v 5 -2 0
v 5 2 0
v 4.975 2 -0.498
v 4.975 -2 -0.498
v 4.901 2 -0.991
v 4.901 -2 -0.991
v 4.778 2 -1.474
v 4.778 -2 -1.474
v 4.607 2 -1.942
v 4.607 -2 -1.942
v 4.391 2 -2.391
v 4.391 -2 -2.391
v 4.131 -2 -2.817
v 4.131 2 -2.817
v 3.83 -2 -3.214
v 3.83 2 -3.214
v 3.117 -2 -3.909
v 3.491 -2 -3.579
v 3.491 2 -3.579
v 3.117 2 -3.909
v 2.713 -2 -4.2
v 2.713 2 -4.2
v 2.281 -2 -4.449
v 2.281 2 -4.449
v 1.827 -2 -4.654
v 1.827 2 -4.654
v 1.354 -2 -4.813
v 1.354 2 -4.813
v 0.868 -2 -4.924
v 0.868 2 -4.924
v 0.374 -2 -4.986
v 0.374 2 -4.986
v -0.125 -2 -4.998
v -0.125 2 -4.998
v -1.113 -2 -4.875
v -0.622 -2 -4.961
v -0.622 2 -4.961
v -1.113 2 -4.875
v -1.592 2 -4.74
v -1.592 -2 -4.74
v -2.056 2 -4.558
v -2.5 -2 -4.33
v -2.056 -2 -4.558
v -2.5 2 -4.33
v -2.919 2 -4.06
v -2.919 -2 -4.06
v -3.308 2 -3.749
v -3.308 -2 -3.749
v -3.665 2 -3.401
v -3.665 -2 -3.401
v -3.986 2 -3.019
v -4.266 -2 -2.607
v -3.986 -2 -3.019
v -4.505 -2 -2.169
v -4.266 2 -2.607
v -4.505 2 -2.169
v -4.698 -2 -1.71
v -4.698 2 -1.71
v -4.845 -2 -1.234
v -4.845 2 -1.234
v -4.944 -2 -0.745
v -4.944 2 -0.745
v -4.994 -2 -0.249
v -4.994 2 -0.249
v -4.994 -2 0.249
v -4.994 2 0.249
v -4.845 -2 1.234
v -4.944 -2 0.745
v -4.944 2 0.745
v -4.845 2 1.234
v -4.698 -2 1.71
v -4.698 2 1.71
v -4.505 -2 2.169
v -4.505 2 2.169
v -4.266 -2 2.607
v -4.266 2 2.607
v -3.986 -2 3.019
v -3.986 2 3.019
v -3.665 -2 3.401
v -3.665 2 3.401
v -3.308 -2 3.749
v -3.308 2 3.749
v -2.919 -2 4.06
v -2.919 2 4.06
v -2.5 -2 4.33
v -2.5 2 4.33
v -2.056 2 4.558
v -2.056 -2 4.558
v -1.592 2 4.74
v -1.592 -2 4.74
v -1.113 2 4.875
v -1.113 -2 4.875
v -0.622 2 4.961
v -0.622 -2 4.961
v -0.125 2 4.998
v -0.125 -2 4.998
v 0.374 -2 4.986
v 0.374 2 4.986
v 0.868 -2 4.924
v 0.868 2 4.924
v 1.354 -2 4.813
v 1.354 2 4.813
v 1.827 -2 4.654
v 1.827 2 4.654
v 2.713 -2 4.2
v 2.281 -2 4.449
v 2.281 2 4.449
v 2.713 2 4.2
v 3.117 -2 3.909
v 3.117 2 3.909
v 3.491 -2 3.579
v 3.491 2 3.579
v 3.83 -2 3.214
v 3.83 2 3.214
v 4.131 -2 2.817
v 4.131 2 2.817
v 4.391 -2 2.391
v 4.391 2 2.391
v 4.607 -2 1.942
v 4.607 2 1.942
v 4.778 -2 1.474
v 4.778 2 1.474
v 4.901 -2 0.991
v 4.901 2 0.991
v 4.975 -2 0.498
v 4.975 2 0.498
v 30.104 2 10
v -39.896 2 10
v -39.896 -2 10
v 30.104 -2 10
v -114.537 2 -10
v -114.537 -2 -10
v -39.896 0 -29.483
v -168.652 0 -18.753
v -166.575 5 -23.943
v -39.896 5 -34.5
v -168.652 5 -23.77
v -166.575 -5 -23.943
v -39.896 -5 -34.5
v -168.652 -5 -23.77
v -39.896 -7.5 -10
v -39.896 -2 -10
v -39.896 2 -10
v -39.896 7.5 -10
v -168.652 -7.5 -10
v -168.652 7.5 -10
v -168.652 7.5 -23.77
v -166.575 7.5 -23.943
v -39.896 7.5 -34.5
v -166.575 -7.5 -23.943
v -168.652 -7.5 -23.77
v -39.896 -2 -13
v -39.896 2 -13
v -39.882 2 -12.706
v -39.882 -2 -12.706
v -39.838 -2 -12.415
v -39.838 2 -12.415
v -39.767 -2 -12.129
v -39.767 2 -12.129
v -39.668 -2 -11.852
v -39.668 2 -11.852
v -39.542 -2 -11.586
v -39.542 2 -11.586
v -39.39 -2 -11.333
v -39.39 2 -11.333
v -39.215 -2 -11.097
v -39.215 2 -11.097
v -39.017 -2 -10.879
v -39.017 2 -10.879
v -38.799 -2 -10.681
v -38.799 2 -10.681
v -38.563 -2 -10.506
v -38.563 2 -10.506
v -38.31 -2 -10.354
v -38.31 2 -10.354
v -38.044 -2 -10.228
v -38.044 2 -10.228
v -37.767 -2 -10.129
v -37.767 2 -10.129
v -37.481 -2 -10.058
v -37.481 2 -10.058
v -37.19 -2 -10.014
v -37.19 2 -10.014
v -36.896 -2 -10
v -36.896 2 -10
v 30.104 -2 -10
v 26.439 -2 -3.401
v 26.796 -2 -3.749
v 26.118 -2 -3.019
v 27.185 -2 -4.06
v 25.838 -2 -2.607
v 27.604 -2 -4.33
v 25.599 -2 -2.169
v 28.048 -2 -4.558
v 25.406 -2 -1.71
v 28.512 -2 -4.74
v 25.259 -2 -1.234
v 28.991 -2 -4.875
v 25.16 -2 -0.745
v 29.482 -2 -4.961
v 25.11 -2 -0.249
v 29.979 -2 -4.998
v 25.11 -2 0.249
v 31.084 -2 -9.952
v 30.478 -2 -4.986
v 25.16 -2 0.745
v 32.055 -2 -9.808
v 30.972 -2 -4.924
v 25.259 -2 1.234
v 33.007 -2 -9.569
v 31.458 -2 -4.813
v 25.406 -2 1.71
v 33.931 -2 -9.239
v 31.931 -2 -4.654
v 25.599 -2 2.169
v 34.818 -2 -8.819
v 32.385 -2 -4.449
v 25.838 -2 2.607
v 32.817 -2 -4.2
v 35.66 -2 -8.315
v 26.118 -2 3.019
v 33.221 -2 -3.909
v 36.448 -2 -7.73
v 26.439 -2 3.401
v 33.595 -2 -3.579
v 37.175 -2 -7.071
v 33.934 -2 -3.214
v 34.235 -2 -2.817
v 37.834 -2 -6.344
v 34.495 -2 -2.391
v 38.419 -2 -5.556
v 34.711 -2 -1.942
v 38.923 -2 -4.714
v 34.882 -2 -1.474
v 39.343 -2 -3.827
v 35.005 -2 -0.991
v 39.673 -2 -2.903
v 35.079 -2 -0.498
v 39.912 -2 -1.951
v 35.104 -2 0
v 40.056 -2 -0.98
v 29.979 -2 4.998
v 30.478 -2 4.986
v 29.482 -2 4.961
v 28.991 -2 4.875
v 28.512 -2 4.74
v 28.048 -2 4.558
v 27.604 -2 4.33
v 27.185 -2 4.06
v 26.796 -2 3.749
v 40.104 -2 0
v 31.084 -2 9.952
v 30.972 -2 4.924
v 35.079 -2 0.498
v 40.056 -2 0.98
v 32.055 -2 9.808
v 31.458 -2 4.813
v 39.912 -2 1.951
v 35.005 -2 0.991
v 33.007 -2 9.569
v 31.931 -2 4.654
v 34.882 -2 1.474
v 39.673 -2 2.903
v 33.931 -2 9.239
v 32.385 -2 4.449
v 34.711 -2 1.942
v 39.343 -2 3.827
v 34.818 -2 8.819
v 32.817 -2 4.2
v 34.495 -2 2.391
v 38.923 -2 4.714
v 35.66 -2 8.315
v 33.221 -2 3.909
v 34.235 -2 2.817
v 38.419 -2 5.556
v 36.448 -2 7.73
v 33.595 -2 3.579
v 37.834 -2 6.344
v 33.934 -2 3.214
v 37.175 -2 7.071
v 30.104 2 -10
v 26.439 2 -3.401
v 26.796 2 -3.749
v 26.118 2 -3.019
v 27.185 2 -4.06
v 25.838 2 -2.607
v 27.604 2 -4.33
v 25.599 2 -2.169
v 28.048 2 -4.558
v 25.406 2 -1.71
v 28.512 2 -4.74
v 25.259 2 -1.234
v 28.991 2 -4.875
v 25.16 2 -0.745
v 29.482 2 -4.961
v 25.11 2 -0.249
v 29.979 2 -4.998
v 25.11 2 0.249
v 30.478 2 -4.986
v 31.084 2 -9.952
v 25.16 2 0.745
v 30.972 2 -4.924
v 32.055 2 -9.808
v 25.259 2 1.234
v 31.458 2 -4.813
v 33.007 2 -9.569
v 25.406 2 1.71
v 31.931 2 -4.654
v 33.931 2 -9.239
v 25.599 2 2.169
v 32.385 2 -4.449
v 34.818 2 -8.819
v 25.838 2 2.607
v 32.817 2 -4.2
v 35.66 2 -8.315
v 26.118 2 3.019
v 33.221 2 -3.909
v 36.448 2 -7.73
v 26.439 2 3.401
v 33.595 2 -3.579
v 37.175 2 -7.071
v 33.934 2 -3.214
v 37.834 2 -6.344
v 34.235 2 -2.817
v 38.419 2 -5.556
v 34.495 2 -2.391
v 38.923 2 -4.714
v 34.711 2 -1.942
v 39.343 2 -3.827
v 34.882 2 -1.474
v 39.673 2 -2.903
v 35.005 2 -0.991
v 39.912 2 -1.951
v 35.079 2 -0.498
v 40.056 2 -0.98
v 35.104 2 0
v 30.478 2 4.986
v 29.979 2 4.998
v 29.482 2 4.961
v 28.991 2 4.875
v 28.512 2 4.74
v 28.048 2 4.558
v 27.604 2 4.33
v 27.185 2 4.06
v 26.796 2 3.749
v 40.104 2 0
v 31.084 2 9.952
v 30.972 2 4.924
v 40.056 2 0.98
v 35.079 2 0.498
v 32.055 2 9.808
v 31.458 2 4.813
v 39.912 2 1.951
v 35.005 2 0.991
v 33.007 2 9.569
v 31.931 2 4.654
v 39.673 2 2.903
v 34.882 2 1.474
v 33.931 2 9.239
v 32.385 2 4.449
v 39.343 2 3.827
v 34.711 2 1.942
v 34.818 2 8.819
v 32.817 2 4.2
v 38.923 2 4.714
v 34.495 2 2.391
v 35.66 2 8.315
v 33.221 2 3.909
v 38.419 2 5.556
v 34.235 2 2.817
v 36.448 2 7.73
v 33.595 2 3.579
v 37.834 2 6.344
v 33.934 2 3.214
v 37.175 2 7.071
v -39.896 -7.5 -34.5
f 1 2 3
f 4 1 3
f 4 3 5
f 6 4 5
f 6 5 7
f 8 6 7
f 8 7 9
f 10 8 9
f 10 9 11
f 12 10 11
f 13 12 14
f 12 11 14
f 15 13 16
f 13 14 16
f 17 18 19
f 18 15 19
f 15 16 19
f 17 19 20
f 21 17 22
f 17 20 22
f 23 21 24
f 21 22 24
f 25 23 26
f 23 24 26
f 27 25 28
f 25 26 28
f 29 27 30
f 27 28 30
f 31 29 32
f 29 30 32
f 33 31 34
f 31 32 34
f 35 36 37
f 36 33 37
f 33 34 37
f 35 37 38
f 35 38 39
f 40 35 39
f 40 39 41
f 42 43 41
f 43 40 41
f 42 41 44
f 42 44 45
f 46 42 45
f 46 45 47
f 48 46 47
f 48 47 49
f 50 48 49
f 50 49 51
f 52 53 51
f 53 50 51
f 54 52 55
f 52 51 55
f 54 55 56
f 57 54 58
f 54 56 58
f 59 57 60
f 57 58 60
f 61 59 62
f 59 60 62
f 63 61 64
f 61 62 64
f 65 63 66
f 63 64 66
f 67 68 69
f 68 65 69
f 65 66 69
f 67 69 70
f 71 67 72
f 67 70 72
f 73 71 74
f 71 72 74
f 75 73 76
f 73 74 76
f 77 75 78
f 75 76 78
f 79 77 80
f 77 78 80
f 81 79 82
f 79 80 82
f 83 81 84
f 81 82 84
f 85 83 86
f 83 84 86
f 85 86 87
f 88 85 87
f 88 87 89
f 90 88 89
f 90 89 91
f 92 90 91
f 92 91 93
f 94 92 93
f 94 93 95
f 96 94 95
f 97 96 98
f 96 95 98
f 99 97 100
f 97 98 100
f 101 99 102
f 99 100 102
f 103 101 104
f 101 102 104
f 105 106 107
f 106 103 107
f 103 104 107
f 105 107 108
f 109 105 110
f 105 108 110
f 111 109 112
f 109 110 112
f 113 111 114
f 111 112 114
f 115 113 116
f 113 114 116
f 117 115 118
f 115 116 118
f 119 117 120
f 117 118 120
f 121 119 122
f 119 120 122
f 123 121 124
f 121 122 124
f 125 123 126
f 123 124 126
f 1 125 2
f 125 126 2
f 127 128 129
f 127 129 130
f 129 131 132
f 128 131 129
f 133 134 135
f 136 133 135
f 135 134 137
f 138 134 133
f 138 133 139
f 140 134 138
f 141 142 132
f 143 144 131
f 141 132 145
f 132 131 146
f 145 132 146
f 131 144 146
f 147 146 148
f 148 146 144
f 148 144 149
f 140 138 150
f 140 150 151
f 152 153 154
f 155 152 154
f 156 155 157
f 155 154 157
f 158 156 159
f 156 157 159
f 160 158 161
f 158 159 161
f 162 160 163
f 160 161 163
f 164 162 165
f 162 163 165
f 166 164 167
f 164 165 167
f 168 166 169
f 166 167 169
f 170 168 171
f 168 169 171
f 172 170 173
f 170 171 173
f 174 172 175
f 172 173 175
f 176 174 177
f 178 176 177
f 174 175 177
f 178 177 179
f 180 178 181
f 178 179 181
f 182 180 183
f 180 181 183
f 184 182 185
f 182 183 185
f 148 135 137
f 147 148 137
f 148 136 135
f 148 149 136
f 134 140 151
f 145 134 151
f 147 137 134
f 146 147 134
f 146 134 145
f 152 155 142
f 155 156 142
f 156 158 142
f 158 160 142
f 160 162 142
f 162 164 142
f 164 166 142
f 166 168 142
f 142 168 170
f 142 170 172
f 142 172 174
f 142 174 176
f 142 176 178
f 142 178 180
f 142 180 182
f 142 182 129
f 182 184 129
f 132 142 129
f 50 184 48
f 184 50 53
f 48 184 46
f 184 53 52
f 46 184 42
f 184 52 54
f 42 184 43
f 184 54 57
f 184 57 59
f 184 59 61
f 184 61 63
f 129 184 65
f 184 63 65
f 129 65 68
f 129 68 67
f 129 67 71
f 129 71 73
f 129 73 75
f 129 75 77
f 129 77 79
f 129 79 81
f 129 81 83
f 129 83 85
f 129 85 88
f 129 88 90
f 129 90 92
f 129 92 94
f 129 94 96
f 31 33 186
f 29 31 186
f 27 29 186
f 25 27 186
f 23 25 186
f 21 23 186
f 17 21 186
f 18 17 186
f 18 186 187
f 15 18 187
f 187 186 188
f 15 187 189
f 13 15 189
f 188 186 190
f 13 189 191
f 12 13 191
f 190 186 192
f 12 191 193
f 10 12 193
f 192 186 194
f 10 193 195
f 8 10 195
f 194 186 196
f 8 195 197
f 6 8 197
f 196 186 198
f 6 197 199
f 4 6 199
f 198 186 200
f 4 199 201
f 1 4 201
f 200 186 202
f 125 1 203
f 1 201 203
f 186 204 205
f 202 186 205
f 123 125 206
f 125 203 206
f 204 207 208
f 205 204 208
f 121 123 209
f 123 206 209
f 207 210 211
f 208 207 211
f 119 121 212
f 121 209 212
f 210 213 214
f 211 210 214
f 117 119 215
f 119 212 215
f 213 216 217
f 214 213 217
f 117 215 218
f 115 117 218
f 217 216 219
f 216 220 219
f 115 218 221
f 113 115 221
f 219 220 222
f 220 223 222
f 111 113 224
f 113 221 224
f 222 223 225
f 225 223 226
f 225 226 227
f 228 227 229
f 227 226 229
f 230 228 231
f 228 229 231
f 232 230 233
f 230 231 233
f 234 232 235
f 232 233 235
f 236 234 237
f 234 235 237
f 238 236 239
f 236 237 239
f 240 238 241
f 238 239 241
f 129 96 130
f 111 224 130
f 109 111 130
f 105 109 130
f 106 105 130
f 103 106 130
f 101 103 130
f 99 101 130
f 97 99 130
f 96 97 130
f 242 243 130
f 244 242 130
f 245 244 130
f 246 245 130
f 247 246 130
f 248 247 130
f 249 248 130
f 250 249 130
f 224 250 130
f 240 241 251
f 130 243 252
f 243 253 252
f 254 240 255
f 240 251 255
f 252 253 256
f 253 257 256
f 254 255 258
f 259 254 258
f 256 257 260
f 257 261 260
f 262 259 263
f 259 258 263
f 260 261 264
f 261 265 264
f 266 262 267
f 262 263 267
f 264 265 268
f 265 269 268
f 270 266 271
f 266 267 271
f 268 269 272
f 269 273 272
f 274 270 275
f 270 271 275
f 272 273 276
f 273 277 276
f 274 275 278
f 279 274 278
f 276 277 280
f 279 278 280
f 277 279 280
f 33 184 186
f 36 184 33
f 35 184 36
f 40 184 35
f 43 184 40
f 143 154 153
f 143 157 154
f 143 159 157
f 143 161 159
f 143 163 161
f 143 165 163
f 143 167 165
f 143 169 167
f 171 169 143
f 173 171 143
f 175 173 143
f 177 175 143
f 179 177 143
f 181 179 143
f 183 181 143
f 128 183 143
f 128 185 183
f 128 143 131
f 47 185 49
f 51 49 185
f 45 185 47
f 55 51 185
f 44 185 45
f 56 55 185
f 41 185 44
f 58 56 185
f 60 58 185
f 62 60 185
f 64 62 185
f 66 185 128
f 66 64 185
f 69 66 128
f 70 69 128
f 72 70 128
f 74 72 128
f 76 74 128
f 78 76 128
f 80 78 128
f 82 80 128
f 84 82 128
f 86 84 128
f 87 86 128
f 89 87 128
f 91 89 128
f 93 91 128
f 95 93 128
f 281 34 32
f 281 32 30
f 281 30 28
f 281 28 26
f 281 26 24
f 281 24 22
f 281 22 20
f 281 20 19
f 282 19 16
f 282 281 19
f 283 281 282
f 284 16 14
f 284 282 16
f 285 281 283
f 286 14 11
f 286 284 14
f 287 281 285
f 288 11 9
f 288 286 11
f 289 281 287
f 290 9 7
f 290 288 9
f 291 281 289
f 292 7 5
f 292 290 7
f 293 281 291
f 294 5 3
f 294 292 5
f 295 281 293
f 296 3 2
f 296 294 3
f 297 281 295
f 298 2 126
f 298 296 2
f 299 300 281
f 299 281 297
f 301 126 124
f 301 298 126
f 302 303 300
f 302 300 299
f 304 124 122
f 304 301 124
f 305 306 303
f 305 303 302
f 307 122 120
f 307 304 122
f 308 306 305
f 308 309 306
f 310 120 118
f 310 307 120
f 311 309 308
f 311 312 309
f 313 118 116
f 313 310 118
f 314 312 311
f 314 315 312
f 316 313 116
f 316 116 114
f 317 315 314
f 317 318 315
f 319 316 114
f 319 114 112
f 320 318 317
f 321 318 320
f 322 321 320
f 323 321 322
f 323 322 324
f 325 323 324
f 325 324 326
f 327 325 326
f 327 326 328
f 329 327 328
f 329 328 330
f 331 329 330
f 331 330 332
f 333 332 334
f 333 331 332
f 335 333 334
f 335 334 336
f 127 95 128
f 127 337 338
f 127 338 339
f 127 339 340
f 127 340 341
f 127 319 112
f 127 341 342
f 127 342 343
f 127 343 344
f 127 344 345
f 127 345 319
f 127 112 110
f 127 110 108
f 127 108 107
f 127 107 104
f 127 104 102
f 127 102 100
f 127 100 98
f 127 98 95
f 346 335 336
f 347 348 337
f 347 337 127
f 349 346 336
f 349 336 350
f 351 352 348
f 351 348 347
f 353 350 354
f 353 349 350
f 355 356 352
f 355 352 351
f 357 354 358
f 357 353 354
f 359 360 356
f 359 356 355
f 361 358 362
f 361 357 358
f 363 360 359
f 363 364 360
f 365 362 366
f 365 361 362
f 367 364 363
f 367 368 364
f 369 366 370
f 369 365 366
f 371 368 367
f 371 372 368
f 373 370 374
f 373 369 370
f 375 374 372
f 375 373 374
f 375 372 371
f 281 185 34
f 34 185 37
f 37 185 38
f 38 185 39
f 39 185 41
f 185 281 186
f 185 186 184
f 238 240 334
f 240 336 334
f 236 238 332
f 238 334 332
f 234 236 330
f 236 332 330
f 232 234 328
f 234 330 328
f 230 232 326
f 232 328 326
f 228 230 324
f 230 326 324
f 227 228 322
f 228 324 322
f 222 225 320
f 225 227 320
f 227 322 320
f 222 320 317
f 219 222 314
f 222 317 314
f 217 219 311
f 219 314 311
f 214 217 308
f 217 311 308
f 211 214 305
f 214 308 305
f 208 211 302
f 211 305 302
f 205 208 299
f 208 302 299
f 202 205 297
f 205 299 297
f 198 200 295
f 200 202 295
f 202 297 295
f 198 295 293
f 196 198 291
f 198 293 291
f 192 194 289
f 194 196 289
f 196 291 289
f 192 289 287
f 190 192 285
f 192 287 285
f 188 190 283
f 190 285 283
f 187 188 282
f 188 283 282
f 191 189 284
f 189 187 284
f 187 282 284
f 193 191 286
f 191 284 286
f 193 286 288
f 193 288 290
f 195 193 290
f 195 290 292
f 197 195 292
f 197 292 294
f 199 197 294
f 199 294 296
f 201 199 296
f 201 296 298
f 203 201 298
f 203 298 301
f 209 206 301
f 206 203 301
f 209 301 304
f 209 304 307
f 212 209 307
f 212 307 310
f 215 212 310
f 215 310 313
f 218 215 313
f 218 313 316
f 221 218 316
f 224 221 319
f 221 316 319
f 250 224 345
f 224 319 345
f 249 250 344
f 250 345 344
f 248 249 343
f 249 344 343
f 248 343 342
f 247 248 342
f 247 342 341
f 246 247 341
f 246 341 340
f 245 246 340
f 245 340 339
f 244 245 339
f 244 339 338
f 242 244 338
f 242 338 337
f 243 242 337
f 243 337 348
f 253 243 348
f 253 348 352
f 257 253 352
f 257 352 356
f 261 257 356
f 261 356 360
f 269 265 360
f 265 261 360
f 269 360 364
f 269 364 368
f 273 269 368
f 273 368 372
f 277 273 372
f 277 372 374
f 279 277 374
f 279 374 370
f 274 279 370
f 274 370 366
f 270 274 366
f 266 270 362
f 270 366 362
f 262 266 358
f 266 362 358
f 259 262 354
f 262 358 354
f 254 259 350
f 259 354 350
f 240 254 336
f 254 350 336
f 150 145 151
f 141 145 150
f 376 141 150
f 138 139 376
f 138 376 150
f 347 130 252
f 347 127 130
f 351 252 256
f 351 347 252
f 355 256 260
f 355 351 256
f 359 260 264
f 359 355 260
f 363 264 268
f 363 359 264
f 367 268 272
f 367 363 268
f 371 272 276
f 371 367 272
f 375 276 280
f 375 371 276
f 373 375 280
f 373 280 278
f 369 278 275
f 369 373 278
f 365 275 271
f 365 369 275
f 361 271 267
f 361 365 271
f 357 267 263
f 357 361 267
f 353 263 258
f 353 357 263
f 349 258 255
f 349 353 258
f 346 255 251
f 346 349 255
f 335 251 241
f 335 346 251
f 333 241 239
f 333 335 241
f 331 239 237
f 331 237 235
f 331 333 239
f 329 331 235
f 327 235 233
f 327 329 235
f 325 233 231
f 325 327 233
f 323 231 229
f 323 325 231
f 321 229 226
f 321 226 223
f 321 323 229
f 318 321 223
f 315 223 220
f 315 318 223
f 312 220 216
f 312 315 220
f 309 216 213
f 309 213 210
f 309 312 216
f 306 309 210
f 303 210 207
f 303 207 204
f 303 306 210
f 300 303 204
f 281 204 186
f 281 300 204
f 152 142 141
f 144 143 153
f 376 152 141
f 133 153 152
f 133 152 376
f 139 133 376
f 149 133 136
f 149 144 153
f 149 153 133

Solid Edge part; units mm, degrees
sketch "Sketch1" plane through (0, 0, 0) normal (0, -1, 0) x (1, 0, 0)
  line L0 (-168.6518, -24.5) -> (-39.896, 10)
  line L1 (-39.896, 10) -> (30.104, 10)
  arc A0 (30.104, 10) -> (30.104, -10) centre (30.104, 0) cw
  line L2 (30.104, -10) -> (-39.896, -10)
  line L3 (-39.896, -10) -> (-39.896, -34.5)
  line L4 (-39.896, -34.5) -> (-168.6518, -34.5)
  line L5 (-168.6518, -34.5) -> (-168.6518, -24.5)
  circle A1 centre (30.104, 0) radius 5
  circle A2 centre (0, 0) radius 5
  dimension "D1" = 10
  dimension "D2" = 30.104
  dimension "D3" = 10
  dimension "D4" = 70
  dimension "D5" = 24.5
  dimension "D6" = 10
  dimension "D7" = 70
extrude "Protrusion1" add sketch "Sketch1" along normal mid plane 4
sketch "Sketch2" plane through (-34.896, 0, -4.3782) normal (0, -1, 0) x (1, 0, 0)
  line L0 (-5, -5.6218) -> (-133.7558, -5.6218)
  line L1 (-133.7558, -19.3921) -> (-133.7558, -5.6218)
  line L2 (-131.6787, -19.5652) -> (-133.7558, -19.3921)
  line L3 (-5, -30.1218) -> (-131.6787, -19.5652)
  line L4 (-5, -5.6218) -> (-5, -30.1218)
extrude "Protrusion2" add sketch "Sketch2" along normal mid plane 15
fillet "Redondeo_2" radius 3 1 edges at (-39.896, 0, -10)
sketch "Sketch3" plane through (-74.896, -7.5, -22.0833) normal (0.9965458, 0, -0.0830455) x (0, 1, 0)
  line L0 (7.5, -4.4672) -> (2.5, -9.4672)
  line L1 (2.5, -9.4672) -> (12.5, -9.4672)
  line L2 (7.5, -4.4672) -> (12.5, -9.4672)
  dimension "D1" = 5
extrude "Cutout1" cut sketch "Sketch3" along normal through all and the other way through all
sketch "Sketch4" plane through (-104.2739, -2, -29.2217) normal (0, -1, 0) x (1, 0, 0)
  line L0 (-64.3779, 5.4514) -> (64.3779, -5.2783)
  line L1 (64.3779, -5.2783) -> (-64.3779, -5.2783)
  line L2 (-64.3779, -5.2783) -> (-64.3779, 5.4514)
extrude "Cutout2" cut sketch "Sketch4" along normal through all and the other way through all
